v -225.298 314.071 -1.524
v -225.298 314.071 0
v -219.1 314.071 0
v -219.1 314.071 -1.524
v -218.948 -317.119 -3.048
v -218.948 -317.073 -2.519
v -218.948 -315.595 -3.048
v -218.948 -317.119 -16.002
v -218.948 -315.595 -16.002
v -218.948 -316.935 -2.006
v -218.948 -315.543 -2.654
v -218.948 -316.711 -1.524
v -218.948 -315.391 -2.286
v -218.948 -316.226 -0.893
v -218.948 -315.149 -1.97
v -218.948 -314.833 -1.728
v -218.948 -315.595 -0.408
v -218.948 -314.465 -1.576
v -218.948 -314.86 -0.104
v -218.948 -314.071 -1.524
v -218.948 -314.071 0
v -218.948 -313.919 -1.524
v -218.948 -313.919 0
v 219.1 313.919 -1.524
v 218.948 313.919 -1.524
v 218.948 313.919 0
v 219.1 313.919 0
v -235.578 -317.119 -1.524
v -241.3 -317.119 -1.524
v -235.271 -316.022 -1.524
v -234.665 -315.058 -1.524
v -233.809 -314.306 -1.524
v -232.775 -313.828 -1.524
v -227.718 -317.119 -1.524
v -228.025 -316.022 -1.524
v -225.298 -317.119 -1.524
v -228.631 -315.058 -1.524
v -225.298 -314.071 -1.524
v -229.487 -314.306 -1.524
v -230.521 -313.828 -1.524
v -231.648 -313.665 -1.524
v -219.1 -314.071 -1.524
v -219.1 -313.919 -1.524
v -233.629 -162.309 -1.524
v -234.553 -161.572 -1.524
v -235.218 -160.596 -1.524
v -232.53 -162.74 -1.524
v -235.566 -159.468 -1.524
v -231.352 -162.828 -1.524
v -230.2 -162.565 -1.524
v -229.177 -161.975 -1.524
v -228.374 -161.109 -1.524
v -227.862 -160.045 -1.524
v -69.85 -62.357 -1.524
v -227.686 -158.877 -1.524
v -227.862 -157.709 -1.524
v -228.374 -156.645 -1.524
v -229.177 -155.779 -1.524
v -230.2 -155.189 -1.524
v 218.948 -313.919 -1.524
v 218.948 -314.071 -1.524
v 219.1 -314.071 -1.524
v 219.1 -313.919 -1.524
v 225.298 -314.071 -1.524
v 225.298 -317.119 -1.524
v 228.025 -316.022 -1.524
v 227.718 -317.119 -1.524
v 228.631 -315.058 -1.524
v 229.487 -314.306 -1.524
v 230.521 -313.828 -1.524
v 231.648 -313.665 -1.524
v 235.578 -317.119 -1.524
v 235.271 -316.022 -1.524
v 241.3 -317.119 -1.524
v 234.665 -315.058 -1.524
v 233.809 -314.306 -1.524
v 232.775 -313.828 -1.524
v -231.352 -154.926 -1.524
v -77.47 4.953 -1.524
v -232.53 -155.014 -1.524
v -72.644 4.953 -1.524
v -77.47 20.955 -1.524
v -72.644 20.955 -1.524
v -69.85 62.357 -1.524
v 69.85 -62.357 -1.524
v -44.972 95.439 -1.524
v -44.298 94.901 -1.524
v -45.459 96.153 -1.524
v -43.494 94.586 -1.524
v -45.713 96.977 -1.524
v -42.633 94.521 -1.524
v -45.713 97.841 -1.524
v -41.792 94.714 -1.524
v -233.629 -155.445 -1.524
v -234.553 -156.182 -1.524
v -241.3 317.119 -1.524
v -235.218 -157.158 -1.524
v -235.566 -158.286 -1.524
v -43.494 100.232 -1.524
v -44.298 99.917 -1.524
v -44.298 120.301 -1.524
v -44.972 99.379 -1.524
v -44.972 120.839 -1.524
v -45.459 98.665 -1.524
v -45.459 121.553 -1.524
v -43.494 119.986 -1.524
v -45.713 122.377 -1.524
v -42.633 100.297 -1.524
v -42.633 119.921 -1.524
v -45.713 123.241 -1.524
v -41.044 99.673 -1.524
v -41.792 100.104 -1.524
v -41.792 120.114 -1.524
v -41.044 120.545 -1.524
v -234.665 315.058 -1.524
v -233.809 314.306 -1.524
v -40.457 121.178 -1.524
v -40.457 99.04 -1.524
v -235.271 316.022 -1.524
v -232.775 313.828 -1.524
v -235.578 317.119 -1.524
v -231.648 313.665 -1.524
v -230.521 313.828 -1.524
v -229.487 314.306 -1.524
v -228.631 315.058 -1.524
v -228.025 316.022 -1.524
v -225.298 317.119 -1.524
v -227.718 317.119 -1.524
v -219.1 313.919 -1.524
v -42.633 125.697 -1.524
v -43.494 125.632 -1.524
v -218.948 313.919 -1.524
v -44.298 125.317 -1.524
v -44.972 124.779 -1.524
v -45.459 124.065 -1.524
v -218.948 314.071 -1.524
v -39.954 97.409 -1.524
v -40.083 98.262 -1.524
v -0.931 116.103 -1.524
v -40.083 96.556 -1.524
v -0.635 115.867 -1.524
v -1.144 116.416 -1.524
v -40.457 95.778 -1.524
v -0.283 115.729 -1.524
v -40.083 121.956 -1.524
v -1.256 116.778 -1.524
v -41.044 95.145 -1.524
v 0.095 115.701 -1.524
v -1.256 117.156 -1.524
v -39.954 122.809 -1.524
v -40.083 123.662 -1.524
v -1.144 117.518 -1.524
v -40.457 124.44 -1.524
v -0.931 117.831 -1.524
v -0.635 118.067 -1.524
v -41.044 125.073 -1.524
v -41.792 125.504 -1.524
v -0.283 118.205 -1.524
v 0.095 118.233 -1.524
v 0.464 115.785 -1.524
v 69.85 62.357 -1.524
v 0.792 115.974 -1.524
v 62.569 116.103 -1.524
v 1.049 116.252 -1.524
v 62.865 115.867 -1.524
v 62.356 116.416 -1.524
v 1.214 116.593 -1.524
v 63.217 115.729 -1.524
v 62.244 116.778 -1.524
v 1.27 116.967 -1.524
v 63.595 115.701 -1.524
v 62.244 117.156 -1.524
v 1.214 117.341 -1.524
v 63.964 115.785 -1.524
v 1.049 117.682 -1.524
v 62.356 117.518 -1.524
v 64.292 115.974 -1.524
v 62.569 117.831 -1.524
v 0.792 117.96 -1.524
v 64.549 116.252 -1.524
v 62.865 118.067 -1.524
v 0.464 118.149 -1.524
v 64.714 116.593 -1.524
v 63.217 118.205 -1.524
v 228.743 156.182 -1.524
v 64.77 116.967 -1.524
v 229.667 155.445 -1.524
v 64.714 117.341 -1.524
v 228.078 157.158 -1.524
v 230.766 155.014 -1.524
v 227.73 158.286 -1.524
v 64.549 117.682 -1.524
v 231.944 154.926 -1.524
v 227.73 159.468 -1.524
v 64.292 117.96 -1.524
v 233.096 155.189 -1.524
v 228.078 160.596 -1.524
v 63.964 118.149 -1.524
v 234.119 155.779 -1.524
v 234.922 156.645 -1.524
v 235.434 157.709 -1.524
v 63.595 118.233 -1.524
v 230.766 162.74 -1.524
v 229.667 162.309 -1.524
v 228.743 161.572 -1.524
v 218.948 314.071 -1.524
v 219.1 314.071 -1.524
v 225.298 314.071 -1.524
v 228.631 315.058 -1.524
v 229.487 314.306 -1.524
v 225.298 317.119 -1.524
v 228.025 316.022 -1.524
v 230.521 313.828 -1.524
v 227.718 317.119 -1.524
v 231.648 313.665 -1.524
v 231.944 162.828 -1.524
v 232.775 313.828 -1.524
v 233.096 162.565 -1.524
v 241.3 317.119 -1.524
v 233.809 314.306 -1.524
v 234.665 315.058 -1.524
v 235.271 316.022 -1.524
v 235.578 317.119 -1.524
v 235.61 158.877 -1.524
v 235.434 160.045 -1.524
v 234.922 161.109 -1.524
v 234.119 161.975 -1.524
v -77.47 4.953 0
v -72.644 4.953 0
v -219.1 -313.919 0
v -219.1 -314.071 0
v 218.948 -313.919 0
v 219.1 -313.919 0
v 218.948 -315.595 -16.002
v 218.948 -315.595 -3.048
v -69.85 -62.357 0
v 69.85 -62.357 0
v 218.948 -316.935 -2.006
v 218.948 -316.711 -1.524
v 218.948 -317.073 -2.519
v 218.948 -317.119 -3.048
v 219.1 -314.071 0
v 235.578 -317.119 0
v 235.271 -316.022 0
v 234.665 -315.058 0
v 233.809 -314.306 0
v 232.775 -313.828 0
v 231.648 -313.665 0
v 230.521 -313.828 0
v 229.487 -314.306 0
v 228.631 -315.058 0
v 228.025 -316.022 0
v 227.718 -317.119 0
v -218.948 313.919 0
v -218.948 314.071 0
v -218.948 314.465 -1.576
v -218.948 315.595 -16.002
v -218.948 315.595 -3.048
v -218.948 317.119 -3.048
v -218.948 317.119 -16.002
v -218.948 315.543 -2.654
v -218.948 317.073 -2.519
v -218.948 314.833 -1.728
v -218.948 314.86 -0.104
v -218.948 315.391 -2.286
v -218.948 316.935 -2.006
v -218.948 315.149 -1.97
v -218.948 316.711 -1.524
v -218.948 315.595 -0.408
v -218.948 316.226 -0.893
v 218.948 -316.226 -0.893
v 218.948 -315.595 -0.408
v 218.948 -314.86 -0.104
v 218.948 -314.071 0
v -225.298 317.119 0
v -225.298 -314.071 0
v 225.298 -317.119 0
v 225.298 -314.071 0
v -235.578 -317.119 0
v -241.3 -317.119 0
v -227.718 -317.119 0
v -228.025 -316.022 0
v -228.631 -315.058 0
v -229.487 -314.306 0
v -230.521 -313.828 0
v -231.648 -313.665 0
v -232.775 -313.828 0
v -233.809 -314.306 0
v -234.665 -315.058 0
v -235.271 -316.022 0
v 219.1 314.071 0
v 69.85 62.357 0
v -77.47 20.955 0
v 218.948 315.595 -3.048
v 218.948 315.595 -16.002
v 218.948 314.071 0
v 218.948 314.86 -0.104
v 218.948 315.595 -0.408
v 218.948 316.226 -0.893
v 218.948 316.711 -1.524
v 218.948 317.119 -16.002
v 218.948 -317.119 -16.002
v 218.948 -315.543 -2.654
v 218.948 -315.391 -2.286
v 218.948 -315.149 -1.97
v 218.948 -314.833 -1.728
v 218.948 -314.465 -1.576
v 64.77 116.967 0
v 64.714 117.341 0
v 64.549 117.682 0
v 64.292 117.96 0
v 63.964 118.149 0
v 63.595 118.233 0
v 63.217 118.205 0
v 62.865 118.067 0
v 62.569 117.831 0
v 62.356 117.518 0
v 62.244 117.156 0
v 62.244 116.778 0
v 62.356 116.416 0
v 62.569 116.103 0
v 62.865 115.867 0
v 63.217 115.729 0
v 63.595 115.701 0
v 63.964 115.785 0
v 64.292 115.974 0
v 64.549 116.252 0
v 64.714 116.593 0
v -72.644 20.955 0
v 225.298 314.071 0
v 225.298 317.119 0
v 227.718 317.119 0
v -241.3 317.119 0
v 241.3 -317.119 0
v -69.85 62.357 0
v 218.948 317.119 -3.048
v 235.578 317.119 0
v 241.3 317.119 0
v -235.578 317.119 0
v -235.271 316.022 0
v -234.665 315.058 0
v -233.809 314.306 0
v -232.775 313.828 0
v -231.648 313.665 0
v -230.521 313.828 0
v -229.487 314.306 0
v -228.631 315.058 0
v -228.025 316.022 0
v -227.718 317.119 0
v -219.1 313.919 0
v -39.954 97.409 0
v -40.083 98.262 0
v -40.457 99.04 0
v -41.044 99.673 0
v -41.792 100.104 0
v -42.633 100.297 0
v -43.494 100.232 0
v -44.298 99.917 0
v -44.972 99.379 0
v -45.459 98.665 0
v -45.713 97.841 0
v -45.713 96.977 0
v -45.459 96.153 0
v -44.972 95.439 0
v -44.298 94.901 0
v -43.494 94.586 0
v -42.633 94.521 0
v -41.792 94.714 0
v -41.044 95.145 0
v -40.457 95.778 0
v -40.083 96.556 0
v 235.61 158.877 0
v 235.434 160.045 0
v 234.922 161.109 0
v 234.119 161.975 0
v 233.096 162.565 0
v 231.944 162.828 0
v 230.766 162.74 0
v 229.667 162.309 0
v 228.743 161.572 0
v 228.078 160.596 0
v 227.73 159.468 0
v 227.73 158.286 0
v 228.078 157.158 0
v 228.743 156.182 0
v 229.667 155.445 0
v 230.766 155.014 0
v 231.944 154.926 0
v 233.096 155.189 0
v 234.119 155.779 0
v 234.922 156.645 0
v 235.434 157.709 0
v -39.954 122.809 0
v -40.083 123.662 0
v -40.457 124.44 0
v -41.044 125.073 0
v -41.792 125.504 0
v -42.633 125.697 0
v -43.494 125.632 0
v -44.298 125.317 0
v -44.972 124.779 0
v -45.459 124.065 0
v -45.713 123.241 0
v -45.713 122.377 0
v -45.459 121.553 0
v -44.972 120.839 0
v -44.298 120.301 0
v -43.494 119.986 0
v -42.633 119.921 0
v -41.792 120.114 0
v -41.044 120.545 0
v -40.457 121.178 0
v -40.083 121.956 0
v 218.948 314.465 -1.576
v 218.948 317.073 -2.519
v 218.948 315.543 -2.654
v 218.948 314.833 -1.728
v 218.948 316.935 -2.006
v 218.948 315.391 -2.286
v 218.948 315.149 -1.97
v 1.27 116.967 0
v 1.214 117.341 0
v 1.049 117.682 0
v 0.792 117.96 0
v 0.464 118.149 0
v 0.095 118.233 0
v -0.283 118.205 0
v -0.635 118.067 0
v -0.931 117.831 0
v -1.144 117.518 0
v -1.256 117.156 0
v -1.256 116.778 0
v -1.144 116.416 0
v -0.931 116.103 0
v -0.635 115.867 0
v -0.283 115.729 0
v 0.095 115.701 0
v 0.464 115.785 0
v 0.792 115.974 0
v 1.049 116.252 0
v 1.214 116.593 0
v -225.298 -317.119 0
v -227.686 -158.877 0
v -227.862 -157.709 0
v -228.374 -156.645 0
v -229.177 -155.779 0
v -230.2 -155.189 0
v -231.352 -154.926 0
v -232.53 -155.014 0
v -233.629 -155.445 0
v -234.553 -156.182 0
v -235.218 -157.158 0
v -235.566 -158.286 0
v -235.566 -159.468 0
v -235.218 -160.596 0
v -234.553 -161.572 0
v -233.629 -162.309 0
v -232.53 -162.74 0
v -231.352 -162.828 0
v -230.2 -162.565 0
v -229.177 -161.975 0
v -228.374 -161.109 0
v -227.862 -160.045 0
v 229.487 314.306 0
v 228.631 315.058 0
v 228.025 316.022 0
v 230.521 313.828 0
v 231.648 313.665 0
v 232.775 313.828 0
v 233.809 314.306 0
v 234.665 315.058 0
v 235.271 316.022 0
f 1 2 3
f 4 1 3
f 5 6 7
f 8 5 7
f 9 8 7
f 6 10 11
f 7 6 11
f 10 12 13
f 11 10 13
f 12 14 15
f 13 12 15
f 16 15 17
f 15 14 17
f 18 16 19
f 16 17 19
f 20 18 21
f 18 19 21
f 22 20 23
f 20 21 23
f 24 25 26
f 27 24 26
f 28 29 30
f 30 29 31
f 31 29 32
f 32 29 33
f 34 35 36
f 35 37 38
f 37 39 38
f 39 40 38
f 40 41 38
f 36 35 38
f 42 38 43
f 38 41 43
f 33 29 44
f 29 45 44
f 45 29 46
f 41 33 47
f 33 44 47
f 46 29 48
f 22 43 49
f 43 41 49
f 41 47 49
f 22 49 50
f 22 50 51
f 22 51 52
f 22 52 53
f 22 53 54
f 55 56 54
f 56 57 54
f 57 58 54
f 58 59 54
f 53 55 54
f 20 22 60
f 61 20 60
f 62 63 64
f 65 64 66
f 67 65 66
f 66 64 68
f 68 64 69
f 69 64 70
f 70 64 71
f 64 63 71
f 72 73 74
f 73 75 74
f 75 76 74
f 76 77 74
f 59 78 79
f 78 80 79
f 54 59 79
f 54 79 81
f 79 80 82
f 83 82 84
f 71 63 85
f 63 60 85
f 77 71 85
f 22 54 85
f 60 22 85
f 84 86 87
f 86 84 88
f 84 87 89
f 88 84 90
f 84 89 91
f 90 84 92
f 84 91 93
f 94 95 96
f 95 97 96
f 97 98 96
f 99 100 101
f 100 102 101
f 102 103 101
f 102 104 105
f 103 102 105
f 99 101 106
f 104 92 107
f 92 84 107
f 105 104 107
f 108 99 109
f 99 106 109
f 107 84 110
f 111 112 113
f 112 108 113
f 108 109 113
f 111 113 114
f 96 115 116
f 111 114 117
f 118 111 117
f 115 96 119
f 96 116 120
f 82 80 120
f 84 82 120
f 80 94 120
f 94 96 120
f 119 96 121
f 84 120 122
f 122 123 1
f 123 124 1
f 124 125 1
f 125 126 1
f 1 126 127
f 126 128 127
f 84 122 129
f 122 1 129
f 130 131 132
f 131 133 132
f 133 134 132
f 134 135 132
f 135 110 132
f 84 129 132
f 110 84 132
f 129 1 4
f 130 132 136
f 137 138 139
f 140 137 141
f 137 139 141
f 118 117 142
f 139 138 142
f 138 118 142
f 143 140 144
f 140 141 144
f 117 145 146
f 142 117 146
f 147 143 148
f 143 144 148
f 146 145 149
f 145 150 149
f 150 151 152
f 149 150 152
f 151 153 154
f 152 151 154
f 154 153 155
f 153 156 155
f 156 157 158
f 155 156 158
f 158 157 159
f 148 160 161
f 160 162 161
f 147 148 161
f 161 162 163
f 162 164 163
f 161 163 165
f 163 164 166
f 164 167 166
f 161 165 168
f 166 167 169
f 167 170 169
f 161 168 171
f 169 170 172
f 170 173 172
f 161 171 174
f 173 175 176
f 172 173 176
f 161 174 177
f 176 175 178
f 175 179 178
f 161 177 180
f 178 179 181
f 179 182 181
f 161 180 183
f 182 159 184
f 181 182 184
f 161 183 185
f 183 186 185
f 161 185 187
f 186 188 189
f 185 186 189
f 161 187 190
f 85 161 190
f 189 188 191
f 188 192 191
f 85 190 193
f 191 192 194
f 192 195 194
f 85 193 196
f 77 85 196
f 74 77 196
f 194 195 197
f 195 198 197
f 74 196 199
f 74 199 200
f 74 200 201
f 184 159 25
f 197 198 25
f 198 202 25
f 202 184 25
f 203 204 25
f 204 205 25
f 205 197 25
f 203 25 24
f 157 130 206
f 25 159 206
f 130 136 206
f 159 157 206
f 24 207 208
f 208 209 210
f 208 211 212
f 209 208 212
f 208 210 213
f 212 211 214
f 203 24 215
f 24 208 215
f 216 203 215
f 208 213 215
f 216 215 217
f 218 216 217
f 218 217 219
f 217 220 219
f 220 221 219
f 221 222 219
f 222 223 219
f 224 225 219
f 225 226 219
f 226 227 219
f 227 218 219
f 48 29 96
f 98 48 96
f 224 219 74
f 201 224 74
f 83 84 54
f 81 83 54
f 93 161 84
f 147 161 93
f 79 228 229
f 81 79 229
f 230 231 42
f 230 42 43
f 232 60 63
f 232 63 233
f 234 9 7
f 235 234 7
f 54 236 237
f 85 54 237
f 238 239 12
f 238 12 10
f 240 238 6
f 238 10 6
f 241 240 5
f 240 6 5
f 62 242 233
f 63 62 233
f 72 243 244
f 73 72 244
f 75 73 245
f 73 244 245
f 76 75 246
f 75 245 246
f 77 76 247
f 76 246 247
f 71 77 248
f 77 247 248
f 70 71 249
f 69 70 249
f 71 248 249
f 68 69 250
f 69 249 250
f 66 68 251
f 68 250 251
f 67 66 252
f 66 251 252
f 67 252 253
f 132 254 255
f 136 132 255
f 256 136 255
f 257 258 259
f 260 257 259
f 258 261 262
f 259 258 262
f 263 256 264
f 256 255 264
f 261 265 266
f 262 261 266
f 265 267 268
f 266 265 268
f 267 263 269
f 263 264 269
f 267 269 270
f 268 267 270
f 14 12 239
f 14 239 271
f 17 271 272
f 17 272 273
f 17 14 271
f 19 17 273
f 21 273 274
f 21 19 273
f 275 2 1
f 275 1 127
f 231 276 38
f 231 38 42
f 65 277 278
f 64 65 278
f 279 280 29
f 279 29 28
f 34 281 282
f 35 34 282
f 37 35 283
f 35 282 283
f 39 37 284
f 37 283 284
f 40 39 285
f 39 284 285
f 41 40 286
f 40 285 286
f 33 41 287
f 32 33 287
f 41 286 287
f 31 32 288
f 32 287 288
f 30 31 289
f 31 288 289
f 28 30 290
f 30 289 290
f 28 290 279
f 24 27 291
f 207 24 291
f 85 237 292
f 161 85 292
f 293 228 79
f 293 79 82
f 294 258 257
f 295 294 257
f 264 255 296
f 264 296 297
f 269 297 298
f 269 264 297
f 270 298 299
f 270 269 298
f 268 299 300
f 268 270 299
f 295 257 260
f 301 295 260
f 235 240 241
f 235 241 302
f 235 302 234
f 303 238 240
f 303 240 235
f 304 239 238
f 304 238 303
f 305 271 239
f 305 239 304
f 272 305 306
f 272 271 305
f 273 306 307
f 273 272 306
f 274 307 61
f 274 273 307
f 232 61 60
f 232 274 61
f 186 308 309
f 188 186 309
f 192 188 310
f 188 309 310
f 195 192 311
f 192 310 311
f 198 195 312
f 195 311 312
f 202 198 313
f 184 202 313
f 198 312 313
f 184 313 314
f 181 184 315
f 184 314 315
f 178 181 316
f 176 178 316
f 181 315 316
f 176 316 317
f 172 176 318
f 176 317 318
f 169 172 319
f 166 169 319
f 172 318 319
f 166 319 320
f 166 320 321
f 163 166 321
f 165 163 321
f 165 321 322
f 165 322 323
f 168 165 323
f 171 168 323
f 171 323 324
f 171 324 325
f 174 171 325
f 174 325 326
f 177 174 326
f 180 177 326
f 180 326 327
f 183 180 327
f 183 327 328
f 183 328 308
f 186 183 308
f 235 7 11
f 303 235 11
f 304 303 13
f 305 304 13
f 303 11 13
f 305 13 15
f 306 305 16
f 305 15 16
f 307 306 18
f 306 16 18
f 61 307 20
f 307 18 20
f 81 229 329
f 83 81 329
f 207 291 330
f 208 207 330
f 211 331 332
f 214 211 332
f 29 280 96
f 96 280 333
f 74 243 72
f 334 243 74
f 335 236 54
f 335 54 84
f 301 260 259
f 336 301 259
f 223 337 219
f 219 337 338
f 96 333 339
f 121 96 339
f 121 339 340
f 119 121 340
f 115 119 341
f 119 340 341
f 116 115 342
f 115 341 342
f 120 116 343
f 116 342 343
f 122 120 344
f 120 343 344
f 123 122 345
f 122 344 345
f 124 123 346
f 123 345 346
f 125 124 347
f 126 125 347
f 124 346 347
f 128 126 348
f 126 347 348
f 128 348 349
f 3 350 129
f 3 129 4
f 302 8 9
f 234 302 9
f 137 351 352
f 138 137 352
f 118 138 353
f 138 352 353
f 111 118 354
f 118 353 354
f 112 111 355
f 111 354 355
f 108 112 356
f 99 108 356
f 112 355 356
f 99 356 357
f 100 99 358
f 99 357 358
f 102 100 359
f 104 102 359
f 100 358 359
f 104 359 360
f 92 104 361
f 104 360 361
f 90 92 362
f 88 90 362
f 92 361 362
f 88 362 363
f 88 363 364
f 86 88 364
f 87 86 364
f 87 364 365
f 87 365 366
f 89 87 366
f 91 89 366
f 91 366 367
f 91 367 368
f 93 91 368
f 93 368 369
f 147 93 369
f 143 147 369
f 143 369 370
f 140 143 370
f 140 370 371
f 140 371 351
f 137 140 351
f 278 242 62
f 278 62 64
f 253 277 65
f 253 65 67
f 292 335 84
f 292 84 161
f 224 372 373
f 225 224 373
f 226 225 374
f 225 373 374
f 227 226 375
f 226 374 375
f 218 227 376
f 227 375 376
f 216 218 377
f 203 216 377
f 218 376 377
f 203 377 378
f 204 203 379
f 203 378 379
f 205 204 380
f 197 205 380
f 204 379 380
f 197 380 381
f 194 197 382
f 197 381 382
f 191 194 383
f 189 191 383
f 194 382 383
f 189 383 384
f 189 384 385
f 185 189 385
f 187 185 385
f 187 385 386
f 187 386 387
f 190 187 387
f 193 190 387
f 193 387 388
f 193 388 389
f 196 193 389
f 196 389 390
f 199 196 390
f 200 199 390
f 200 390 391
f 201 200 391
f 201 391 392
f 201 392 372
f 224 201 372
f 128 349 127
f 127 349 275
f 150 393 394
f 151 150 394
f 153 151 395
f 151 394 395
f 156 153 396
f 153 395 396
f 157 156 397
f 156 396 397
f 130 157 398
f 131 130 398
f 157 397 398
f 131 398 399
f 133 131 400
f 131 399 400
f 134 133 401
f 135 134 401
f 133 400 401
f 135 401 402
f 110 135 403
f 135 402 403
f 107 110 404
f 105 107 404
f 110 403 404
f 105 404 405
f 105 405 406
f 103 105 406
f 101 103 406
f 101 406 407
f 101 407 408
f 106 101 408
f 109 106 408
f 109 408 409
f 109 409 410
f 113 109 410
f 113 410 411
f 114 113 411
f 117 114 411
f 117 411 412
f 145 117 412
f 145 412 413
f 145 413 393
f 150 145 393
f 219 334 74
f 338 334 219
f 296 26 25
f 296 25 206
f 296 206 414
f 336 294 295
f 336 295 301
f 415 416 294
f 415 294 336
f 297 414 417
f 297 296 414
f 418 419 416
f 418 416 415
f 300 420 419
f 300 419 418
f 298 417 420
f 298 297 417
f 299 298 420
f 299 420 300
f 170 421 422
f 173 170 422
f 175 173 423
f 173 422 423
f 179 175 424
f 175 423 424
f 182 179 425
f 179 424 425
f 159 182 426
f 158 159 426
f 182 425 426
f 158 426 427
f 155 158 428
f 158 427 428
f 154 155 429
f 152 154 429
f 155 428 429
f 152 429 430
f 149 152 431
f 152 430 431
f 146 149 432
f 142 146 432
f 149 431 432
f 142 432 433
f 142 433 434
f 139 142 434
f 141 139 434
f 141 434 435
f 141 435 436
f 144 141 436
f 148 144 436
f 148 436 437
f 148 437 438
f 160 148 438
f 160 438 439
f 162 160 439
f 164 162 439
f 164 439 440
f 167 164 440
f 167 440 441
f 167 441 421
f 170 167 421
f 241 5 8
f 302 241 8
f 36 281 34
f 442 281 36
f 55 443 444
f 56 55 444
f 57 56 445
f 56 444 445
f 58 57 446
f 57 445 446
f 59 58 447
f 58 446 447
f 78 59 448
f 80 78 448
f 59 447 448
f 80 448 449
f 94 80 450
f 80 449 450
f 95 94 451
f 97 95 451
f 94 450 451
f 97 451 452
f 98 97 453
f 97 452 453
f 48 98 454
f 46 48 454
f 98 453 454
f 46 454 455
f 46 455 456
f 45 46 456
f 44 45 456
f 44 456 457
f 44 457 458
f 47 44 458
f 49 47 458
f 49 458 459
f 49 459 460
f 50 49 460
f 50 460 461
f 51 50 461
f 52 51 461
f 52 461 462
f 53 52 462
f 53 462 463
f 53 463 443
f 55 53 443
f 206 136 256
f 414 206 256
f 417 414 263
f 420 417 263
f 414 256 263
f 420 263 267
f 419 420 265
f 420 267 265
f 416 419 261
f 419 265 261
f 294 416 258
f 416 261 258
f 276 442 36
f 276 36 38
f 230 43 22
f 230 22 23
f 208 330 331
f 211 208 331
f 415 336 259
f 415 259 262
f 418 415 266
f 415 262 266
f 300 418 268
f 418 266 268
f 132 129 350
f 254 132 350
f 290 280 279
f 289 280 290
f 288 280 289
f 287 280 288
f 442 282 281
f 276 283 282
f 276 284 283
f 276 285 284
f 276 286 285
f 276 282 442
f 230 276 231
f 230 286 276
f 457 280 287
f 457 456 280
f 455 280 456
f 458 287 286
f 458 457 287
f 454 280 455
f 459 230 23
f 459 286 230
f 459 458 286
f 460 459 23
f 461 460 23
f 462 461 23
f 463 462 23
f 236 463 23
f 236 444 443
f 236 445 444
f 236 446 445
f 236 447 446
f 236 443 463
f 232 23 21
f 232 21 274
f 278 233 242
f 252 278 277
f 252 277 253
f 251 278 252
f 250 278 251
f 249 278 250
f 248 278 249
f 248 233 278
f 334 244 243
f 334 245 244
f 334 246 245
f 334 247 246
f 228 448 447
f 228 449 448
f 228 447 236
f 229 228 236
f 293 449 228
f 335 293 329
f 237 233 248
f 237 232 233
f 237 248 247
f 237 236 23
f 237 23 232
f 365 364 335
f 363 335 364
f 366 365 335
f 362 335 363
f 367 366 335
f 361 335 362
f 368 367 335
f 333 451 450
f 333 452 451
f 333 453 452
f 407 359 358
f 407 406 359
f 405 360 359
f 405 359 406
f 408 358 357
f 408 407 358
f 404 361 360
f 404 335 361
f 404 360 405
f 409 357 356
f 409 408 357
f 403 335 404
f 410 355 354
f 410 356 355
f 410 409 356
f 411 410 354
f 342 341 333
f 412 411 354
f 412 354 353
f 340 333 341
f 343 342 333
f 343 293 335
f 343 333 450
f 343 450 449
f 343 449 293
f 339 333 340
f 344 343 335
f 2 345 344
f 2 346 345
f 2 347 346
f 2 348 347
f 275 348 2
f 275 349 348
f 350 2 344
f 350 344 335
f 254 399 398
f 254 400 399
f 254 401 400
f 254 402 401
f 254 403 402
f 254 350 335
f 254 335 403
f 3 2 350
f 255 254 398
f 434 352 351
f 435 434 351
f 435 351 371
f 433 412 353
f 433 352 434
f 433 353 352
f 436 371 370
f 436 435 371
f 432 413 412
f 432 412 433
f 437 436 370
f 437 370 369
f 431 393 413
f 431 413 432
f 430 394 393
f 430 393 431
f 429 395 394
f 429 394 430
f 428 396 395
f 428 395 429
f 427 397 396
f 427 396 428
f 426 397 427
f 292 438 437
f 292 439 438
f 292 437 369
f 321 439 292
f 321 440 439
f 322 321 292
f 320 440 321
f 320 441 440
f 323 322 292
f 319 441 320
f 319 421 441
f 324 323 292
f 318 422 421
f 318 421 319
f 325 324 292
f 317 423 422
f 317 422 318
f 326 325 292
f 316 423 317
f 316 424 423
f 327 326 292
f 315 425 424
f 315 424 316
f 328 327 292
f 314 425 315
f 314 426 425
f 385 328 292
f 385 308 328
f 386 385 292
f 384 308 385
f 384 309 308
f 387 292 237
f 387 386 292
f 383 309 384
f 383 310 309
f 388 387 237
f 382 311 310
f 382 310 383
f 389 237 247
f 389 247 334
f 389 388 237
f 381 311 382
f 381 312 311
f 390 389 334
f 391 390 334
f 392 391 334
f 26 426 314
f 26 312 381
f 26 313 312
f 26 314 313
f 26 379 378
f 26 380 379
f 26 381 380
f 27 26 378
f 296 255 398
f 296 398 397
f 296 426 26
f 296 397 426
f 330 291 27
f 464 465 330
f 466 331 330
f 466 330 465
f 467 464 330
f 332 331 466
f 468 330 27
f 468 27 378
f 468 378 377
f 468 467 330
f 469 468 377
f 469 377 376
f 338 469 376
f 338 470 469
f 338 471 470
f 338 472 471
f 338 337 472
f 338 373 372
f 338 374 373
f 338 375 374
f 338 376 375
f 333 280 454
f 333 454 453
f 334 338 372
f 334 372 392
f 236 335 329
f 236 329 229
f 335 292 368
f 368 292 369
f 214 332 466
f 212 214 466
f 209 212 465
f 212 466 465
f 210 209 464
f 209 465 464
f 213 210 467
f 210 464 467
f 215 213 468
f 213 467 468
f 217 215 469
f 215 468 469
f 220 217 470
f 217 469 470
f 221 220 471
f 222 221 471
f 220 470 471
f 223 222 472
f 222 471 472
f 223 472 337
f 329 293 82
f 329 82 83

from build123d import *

# Parameters (mm, degrees)
CROQUIS1_W                   = 482.6
CROQUIS1_H                   = 634.238
BRIDA_BASE1_DEPTH            = 1.524
CROQUIS6_R                   = 3.9624
CROQUIS6_W                   = 6.35
CROQUIS6_H                   = 3.048
CORTAR_EXTRUIR1_DEPTH        = 399.487732229
BRIDA_START                  = -218.948
BRIDA_DE_ARISTA1_DEPTH       = 437.896
BRIDA_START_2                = -219.1004
BRIDA_DE_ARISTA1_2_OUTLINE_W = 0.1524
BRIDA_DE_ARISTA1_2_OUTLINE_H = 1.524
BRIDA_DE_ARISTA1_2_DEPTH     = 0.1524
BRIDA_START_3                = 218.948
BRIDA_DE_ARISTA1_3_OUTLINE_W = 0.1524
BRIDA_DE_ARISTA1_3_OUTLINE_H = 1.524
BRIDA_DE_ARISTA1_3_DEPTH     = 0.1524
BRIDA_DE_ARISTA1_4_DEPTH     = 437.896
CORTAR_EXTRUIR2_REACH        = 400.806
CROQUIS13_R                  = 3.9624
CROQUIS13_R_2                = 2.8956
CROQUIS13_R_3                = 1.27
CROQUIS13_W                  = 139.7
CROQUIS13_H                  = 124.714
CROQUIS13_W_2                = 4.826
CROQUIS13_H_2                = 16.002


# Read off the part's stored shape, not the designer's step: Brida de arista1
# Sheet-metal steps are written as plain solids
with BuildPart() as part:
    # Croquis1 → Brida base1 (new body)
    with BuildSketch(Plane.XY):
        Rectangle(CROQUIS1_W, CROQUIS1_H)
    extrude(amount=-BRIDA_BASE1_DEPTH)

    # Croquis6 → Cortar-Extruir1 (cut, through all)
    with BuildSketch(Plane.XY):
        with Locations((231.648, 317.627)):
            Circle(CROQUIS6_R)
        with Locations((-231.648, 317.627)):
            Circle(CROQUIS6_R)
        with Locations((-231.648, -317.627)):
            Circle(CROQUIS6_R)
        with Locations((231.648, -317.627)):
            Circle(CROQUIS6_R)
        with Locations((-222.123, 315.595)):
            Rectangle(CROQUIS6_W, CROQUIS6_H)
        with Locations((222.123, 315.595)):
            Rectangle(CROQUIS6_W, CROQUIS6_H)
        with Locations((-222.123, -315.595)):
            Rectangle(CROQUIS6_W, CROQUIS6_H)
        with Locations((222.123, -315.595)):
            Rectangle(CROQUIS6_W, CROQUIS6_H)
    extrude(amount=-CORTAR_EXTRUIR1_DEPTH, mode=Mode.SUBTRACT)

    # Brida de arista1 outline → Brida de arista1 (cut)
    with BuildSketch(Plane.YZ.offset(BRIDA_START)):
        with BuildLine():
            ThreePointArc((-316.710645431, -1.524), (-315.595, -0.408354569), (-314.071, 0))
            Line((-314.071, 0), (-317.119, 0))
            Line((-317.119, 0), (-317.119, -1.524))
            Line((-317.119, -1.524), (-316.710645431, -1.524))
        make_face()
        with BuildLine():
            Line((317.119, 0), (314.071, 0))
            ThreePointArc((314.071, 0), (315.595, -0.408354569), (316.710645431, -1.524))
            Line((316.710645431, -1.524), (317.119, -1.524))
            Line((317.119, -1.524), (317.119, 0))
        make_face()
    extrude(amount=BRIDA_DE_ARISTA1_DEPTH, mode=Mode.SUBTRACT)

    # Brida de arista1 2 outline → Brida de arista1 2 (cut)
    with BuildSketch(Plane.YZ.offset(BRIDA_START_2)):
        with Locations((-313.9948, -0.762)):
            Rectangle(BRIDA_DE_ARISTA1_2_OUTLINE_W, BRIDA_DE_ARISTA1_2_OUTLINE_H)
        with Locations((313.9948, -0.762)):
            Rectangle(BRIDA_DE_ARISTA1_2_OUTLINE_W, BRIDA_DE_ARISTA1_2_OUTLINE_H)
    extrude(amount=BRIDA_DE_ARISTA1_2_DEPTH, mode=Mode.SUBTRACT)

    # Brida de arista1 3 outline → Brida de arista1 3 (cut)
    with BuildSketch(Plane.YZ.offset(BRIDA_START_3)):
        with Locations((-313.9948, -0.762)):
            Rectangle(BRIDA_DE_ARISTA1_3_OUTLINE_W, BRIDA_DE_ARISTA1_3_OUTLINE_H)
        with Locations((313.9948, -0.762)):
            Rectangle(BRIDA_DE_ARISTA1_3_OUTLINE_W, BRIDA_DE_ARISTA1_3_OUTLINE_H)
    extrude(amount=BRIDA_DE_ARISTA1_3_DEPTH, mode=Mode.SUBTRACT)

    # Brida de arista1 4 outline → Brida de arista1 4 (add)
    with BuildSketch(Plane.YZ.offset(BRIDA_START)):
        with BuildLine():
            ThreePointArc((-315.595, -3.048), (-315.148630735, -1.970369265), (-314.071, -1.524))
            Line((-314.071, -1.524), (-316.710645431, -1.524))
            ThreePointArc((-316.710645431, -1.524), (-317.015141918, -2.259119551), (-317.119, -3.048))
            Line((-317.119, -3.048), (-317.119, -16.002))
            Line((-317.119, -16.002), (-315.595, -16.002))
            Line((-315.595, -16.002), (-315.595, -3.048))
        make_face()
        with BuildLine():
            Line((316.710645431, -1.524), (314.071, -1.524))
            ThreePointArc((314.071, -1.524), (315.148630735, -1.970369265), (315.595, -3.048))
            Line((315.595, -3.048), (315.595, -16.002))
            Line((315.595, -16.002), (317.119, -16.002))
            Line((317.119, -16.002), (317.119, -3.048))
            ThreePointArc((317.119, -3.048), (317.015141918, -2.259119551), (316.710645431, -1.524))
        make_face()
    extrude(amount=BRIDA_DE_ARISTA1_4_DEPTH)

    # Croquis13 → Cortar-Extruir2 (cut, up to next)
    with BuildSketch(Plane.XY, mode=Mode.PRIVATE) as cortar_extruir2_sk1:
        with Locations((-231.648, -158.877)):
            Circle(CROQUIS13_R)
    cortar_extruir2_tool1 = extrude(cortar_extruir2_sk1.sketch, amount=-CORTAR_EXTRUIR2_REACH, mode=Mode.PRIVATE) & part.part
    # Croquis13 → Cortar-Extruir2 (cut, up to next)
    with BuildSketch(Plane.XY, mode=Mode.PRIVATE) as cortar_extruir2_sk2:
        with Locations((231.648, 158.877)):
            Circle(CROQUIS13_R)
    cortar_extruir2_tool2 = extrude(cortar_extruir2_sk2.sketch, amount=-CORTAR_EXTRUIR2_REACH, mode=Mode.PRIVATE) & part.part
    # Croquis13 → Cortar-Extruir2 (cut, up to next)
    with BuildSketch(Plane.XY, mode=Mode.PRIVATE) as cortar_extruir2_sk3:
        with Locations((-42.8498, 97.409)):
            Circle(CROQUIS13_R_2)
    cortar_extruir2_tool3 = extrude(cortar_extruir2_sk3.sketch, amount=-CORTAR_EXTRUIR2_REACH, mode=Mode.PRIVATE) & part.part
    # Croquis13 → Cortar-Extruir2 (cut, up to next)
    with BuildSketch(Plane.XY, mode=Mode.PRIVATE) as cortar_extruir2_sk4:
        with Locations((-42.8498, 122.809)):
            Circle(CROQUIS13_R_2)
    cortar_extruir2_tool4 = extrude(cortar_extruir2_sk4.sketch, amount=-CORTAR_EXTRUIR2_REACH, mode=Mode.PRIVATE) & part.part
    # Croquis13 → Cortar-Extruir2 (cut, up to next)
    with BuildSketch(Plane.XY, mode=Mode.PRIVATE) as cortar_extruir2_sk5:
        with Locations((0, 116.967)):
            Circle(CROQUIS13_R_3)
    cortar_extruir2_tool5 = extrude(cortar_extruir2_sk5.sketch, amount=-CORTAR_EXTRUIR2_REACH, mode=Mode.PRIVATE) & part.part
    # Croquis13 → Cortar-Extruir2 (cut, up to next)
    with BuildSketch(Plane.XY, mode=Mode.PRIVATE) as cortar_extruir2_sk6:
        with Locations((63.5, 116.967)):
            Circle(CROQUIS13_R_3)
    cortar_extruir2_tool6 = extrude(cortar_extruir2_sk6.sketch, amount=-CORTAR_EXTRUIR2_REACH, mode=Mode.PRIVATE) & part.part
    # Croquis13 → Cortar-Extruir2 (cut, up to next)
    with BuildSketch(Plane.XY, mode=Mode.PRIVATE) as cortar_extruir2_sk7:
        Rectangle(CROQUIS13_W, CROQUIS13_H)
    cortar_extruir2_tool7 = extrude(cortar_extruir2_sk7.sketch, amount=-CORTAR_EXTRUIR2_REACH, mode=Mode.PRIVATE) & part.part
    # Croquis13 → Cortar-Extruir2 (cut, up to next)
    with BuildSketch(Plane.XY, mode=Mode.PRIVATE) as cortar_extruir2_sk8:
        with Locations((-75.057, 12.954)):
            Rectangle(CROQUIS13_W_2, CROQUIS13_H_2)
    cortar_extruir2_tool8 = extrude(cortar_extruir2_sk8.sketch, amount=-CORTAR_EXTRUIR2_REACH, mode=Mode.PRIVATE) & part.part
    add(cortar_extruir2_tool1.solids().sort_by_distance((-231.648, -158.877, 0))[0], mode=Mode.SUBTRACT)
    add(cortar_extruir2_tool2.solids().sort_by_distance((231.648, 158.877, 0))[0], mode=Mode.SUBTRACT)
    add(cortar_extruir2_tool3.solids().sort_by_distance((-42.8498, 97.409, 0))[0], mode=Mode.SUBTRACT)
    add(cortar_extruir2_tool4.solids().sort_by_distance((-42.8498, 122.809, 0))[0], mode=Mode.SUBTRACT)
    add(cortar_extruir2_tool5.solids().sort_by_distance((0, 116.967, 0))[0], mode=Mode.SUBTRACT)
    add(cortar_extruir2_tool6.solids().sort_by_distance((63.5, 116.967, 0))[0], mode=Mode.SUBTRACT)
    add(cortar_extruir2_tool7.solids().sort_by_distance((0, 0, 0))[0], mode=Mode.SUBTRACT)
    add(cortar_extruir2_tool8.solids().sort_by_distance((-75.057, 12.954, 0))[0], mode=Mode.SUBTRACT)


solid = part.part
